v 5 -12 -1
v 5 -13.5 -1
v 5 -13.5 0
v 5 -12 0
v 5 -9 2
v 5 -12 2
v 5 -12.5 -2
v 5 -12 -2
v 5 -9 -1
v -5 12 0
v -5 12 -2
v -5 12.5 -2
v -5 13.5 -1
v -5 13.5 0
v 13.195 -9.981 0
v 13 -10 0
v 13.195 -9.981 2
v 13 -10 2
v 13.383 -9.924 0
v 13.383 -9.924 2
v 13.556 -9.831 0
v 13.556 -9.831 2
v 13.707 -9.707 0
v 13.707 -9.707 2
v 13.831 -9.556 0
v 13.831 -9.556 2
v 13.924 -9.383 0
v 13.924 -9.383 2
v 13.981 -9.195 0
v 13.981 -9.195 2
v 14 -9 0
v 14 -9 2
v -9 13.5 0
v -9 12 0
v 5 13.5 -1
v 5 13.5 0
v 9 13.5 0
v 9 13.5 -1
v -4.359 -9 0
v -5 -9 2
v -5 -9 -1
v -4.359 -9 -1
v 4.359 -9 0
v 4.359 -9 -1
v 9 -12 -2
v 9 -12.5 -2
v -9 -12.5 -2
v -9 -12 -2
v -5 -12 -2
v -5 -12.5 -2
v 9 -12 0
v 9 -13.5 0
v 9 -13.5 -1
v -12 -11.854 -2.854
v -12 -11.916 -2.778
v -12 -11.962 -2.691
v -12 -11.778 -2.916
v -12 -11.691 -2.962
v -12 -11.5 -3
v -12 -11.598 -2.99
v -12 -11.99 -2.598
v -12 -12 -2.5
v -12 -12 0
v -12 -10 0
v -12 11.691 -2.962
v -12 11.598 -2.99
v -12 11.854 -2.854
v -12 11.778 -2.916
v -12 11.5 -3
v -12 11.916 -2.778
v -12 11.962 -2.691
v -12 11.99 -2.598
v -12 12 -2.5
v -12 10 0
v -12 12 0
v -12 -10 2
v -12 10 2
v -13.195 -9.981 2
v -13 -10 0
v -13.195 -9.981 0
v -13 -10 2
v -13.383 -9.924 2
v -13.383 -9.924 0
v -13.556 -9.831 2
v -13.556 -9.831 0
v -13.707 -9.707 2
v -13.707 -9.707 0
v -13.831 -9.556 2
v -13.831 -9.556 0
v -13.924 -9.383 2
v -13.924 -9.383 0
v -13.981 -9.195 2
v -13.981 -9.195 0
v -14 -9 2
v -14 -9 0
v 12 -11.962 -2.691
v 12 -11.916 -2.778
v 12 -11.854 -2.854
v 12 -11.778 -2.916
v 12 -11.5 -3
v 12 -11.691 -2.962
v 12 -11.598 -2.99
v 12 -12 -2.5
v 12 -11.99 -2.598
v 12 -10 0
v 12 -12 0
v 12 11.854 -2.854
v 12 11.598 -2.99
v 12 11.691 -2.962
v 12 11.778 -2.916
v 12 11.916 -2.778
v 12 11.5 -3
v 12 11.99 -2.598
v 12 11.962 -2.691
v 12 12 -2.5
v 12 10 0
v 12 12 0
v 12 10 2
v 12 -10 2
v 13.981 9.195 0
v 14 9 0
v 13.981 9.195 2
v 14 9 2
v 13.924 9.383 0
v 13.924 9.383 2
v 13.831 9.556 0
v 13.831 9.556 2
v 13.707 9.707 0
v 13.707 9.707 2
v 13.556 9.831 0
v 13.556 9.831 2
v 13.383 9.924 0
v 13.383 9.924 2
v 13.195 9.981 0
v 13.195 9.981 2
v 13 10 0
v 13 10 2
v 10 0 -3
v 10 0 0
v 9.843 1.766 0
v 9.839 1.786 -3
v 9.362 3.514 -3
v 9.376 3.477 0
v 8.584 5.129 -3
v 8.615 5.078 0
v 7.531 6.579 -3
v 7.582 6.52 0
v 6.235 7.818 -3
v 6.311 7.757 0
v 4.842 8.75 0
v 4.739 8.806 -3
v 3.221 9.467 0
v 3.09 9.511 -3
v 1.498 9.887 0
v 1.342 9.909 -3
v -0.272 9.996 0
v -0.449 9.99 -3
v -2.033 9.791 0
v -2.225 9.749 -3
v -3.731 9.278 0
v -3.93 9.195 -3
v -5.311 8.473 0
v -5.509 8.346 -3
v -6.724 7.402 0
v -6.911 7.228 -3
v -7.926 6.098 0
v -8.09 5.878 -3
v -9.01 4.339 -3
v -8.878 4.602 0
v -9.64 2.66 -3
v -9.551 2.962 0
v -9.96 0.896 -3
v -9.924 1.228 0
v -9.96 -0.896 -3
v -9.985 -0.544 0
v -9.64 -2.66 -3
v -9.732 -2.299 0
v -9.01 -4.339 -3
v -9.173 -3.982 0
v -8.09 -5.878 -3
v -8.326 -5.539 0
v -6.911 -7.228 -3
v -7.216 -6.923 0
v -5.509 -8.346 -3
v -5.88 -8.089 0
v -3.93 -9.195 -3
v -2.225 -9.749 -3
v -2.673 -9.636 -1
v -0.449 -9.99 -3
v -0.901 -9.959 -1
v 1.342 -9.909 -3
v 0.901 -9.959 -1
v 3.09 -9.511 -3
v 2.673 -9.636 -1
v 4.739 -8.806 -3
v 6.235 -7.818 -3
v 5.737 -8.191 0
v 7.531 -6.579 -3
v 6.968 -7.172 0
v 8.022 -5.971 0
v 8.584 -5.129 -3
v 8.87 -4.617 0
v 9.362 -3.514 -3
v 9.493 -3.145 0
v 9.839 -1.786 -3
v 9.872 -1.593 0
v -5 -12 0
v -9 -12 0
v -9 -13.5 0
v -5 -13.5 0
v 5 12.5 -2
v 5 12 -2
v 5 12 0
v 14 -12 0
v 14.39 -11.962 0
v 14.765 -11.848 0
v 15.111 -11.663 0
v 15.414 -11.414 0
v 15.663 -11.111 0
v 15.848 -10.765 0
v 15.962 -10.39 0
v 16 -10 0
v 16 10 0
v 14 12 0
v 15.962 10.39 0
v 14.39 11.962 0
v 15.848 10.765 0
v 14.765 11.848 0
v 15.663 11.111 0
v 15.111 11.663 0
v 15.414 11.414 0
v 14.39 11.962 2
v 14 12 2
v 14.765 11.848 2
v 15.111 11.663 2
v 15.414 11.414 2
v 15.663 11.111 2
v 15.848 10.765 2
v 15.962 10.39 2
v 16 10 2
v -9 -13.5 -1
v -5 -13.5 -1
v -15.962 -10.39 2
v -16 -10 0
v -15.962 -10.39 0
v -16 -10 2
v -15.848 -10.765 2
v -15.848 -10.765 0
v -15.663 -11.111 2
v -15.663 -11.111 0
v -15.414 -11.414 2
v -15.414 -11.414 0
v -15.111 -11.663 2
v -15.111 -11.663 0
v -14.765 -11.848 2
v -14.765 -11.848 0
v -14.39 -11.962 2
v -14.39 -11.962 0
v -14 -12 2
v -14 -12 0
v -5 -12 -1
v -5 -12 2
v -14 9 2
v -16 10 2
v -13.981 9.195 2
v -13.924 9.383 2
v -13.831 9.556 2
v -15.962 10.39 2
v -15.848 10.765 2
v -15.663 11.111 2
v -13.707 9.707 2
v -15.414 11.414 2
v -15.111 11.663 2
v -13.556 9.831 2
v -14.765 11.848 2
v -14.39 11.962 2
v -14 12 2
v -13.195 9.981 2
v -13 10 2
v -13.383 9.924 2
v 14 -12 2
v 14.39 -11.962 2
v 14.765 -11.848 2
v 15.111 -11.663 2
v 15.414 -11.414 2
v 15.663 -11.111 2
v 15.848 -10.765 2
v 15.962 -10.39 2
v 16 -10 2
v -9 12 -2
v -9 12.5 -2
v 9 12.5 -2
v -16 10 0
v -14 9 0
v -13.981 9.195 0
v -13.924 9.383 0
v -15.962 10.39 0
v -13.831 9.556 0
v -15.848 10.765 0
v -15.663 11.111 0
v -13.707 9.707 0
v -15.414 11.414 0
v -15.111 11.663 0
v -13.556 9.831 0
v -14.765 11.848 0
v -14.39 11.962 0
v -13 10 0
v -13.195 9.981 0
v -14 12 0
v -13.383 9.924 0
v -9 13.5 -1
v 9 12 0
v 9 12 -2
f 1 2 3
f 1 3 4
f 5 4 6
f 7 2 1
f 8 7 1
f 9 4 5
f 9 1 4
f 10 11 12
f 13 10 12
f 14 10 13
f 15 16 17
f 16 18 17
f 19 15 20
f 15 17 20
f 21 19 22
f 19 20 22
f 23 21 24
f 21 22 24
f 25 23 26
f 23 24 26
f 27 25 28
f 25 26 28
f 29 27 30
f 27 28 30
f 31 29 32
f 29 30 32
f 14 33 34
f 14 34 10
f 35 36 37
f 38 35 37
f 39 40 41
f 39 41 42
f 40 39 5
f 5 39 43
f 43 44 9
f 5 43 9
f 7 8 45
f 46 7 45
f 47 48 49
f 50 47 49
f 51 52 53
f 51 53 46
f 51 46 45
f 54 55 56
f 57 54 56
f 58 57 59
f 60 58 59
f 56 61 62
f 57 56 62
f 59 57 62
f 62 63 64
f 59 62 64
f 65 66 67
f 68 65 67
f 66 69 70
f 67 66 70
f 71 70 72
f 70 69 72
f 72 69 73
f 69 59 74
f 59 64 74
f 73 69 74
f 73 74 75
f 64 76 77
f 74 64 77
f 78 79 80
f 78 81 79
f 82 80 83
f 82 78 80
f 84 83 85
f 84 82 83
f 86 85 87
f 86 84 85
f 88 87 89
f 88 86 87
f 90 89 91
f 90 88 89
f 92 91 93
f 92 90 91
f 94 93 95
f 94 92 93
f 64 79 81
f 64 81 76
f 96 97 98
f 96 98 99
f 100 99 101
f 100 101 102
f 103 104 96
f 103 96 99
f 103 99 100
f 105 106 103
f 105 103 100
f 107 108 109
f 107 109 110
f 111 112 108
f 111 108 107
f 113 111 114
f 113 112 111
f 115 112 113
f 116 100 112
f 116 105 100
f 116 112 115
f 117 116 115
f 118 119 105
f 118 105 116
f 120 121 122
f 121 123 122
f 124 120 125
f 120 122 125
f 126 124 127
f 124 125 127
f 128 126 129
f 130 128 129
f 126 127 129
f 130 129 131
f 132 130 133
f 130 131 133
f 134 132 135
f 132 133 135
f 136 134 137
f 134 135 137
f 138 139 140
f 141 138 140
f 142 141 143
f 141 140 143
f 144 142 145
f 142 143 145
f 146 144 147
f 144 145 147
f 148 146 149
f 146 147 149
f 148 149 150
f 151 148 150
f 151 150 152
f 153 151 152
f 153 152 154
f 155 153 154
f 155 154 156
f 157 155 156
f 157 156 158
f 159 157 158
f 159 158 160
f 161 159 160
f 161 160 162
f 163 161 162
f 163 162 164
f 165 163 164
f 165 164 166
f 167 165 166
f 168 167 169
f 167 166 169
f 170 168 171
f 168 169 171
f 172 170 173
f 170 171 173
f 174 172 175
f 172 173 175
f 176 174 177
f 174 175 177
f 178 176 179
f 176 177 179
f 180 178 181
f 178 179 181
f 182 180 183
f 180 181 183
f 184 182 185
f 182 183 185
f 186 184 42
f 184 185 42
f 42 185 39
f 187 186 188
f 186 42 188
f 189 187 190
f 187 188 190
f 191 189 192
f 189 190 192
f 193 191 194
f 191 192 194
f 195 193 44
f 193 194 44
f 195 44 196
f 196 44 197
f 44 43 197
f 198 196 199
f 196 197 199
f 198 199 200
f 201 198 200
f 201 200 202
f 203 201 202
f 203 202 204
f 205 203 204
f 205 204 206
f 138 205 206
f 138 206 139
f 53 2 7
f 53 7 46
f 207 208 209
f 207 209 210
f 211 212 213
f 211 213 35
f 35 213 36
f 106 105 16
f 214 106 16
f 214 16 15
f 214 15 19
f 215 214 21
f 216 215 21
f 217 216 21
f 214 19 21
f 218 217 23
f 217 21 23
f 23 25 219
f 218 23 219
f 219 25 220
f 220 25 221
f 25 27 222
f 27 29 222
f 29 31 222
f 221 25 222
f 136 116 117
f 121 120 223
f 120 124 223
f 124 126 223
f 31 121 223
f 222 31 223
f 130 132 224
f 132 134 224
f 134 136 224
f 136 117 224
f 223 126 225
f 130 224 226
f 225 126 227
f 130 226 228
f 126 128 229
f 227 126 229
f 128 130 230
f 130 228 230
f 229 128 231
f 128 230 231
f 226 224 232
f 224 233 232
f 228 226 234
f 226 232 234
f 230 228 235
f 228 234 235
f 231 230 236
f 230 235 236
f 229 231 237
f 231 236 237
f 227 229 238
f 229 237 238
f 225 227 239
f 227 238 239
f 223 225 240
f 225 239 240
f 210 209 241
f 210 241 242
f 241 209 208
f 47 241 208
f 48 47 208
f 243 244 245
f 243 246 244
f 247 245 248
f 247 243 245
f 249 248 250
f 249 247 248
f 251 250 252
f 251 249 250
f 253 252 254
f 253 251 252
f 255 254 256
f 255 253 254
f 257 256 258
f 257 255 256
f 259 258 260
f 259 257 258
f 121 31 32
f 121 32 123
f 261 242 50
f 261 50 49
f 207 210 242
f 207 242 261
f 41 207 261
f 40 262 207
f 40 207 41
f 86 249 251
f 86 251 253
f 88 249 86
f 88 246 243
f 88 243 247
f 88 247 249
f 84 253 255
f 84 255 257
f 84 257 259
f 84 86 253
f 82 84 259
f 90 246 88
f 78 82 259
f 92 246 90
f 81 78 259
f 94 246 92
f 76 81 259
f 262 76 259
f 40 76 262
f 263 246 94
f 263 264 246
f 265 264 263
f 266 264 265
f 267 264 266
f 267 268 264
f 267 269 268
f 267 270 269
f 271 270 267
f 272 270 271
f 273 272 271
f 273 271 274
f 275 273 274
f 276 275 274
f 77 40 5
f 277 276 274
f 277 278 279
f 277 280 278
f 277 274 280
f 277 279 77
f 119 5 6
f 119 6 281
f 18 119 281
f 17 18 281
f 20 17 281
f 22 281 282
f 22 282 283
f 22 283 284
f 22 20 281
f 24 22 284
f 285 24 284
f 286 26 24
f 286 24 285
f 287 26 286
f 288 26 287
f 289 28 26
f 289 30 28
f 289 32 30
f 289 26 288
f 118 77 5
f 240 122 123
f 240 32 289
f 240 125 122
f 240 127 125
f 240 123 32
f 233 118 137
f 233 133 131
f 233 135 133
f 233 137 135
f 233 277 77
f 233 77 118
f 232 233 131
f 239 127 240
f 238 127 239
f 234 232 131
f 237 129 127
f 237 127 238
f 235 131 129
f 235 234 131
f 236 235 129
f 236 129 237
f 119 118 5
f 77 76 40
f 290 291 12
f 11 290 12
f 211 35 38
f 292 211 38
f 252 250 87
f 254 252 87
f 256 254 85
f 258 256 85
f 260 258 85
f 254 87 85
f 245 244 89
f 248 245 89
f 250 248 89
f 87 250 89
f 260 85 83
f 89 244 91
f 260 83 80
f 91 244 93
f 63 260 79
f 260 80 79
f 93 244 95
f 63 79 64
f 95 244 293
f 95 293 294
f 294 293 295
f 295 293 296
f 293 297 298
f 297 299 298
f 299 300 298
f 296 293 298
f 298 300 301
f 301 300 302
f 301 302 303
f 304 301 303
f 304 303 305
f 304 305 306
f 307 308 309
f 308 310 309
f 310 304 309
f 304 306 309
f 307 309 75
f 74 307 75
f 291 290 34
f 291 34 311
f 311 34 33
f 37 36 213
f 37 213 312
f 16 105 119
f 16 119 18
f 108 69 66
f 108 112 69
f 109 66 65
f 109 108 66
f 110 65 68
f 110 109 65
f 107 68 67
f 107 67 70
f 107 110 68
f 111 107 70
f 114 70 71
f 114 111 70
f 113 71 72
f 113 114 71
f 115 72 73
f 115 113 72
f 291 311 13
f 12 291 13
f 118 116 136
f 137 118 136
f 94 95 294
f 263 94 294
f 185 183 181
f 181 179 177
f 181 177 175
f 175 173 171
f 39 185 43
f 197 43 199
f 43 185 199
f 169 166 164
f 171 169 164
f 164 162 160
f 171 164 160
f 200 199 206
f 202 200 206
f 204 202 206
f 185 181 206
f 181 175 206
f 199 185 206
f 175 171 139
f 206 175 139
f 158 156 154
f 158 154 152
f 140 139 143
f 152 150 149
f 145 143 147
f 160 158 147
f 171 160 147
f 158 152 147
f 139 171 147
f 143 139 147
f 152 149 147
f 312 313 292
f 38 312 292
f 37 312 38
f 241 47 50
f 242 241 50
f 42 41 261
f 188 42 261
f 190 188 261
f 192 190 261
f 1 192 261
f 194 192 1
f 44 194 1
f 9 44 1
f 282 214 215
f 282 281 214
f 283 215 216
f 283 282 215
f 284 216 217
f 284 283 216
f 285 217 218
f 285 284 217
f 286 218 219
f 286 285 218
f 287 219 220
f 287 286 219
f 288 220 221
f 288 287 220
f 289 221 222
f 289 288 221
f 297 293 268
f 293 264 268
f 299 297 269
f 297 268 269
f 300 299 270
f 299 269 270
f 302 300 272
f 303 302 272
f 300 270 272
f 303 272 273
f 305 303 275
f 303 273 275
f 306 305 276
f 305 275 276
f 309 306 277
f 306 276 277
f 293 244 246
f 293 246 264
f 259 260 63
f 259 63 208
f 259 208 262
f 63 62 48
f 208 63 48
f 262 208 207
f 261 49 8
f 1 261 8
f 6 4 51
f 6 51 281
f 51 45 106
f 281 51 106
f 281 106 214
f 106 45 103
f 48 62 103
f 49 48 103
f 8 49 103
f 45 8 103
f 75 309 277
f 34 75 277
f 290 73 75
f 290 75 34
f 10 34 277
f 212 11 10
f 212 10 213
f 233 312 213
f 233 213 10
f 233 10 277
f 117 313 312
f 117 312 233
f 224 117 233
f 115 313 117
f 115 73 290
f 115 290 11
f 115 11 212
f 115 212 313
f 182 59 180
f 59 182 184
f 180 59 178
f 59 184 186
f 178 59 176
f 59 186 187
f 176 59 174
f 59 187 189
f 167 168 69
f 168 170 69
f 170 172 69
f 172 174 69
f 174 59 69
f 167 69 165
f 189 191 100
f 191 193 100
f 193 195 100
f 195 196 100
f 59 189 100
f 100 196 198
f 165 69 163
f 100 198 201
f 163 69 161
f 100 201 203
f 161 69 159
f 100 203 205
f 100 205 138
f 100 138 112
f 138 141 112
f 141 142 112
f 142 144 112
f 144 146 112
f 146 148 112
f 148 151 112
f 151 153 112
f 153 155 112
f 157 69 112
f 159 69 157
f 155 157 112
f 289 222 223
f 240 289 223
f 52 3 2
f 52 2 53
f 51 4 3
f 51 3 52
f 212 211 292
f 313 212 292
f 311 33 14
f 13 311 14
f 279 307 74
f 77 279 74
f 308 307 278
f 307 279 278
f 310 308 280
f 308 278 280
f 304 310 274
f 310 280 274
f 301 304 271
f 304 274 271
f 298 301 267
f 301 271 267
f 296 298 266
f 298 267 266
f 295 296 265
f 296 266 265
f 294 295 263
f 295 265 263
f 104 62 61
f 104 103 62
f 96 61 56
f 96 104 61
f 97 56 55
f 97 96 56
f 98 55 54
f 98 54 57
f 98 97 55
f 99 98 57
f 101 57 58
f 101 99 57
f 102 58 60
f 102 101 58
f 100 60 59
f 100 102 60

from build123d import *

# Parameters (mm, degrees)
F2_W      = 32
F2_H      = 24
F3_DEPTH  = 2
F0_W      = 24
F0_H      = 24
F4_DEPTH  = 3
F1_R      = 10
F5_DEPTH  = 3
F6_W      = 2
F6_H      = 20
F7_DEPTH  = 2
F8_R      = 2
F9_R      = 1
F10_W     = 10
F10_H     = 3
F11_DEPTH = 1
F12_DEPTH = 2
F13_W     = 4
F13_H     = 1.5
F14_DEPTH = 2
F15_SIZE  = 1
F16_R     = 0.5


with BuildPart() as f3:
    # F2 (on Top) → F3 (new body)
    with BuildSketch(Plane.XY):
        Rectangle(F2_W, F2_H)
    extrude(amount=F3_DEPTH)

    # F0 (on Top) → F4 (join)
    with BuildSketch(Plane.XY):
        Rectangle(F0_W, F0_H)
    extrude(amount=-F4_DEPTH)

    # F1 (on Top) → F5 (cut)
    with BuildSketch(Plane.XY):
        Circle(F1_R)
    extrude(amount=-F5_DEPTH, mode=Mode.SUBTRACT)

    # F6 (on Top) → F7 (cut)
    with BuildSketch(Plane.XY):
        with Locations((-13, 0)):
            Rectangle(F6_W, F6_H)
        with Locations((13, 0)):
            Rectangle(F6_W, F6_H)
    extrude(amount=F7_DEPTH, mode=Mode.SUBTRACT)

    # F8
    f8_edges = [f3.edges().sort_by_distance(p)[0] for p in [
        (16, -12, 1),
        (16, 12, 1),
        (-16, -12, 1),
        (-16, 12, 1),
    ]]
    fillet(f8_edges, radius=F8_R)

    # F9
    f9_edges = [f3.edges().sort_by_distance(p)[0] for p in [
        (-14, 10, 1),
        (14, 10, 1),
        (-14, -10, 1),
        (14, -10, 1),
    ]]
    fillet(f9_edges, radius=F9_R)

    # F10 (on Top) → F11 (cut)
    with BuildSketch(Plane.XY):
        with Locations((0, -10.5)):
            Rectangle(F10_W, F10_H)
    extrude(amount=-F11_DEPTH, mode=Mode.SUBTRACT)

    # F10 (on Top) → F12 (cut)
    with BuildSketch(Plane.XY):
        with Locations((0, -10.5)):
            Rectangle(F10_W, F10_H)
    extrude(amount=F12_DEPTH, mode=Mode.SUBTRACT)

    # F13 (on Top) → F14 (join)
    with BuildSketch(Plane.XY):
        with Locations((-7, -12.75)):
            Rectangle(F13_W, F13_H)
        with Locations((-7, 12.75)):
            Rectangle(F13_W, F13_H)
        with Locations((7, -12.75)):
            Rectangle(F13_W, F13_H)
        with Locations((7, 12.75)):
            Rectangle(F13_W, F13_H)
    extrude(amount=-F14_DEPTH)

    # F15
    f15_edges = [f3.edges().sort_by_distance(p)[0] for p in [
        (-7, -13.5, -2),
        (7, -13.5, -2),
        (7, 13.5, -2),
        (-7, 13.5, -2),
    ]]
    chamfer(f15_edges, length=F15_SIZE)

    # F16
    f16_edges = [f3.edges().sort_by_distance(p)[0] for p in [
        (0, -12, -3),
        (0, 12, -3),
    ]]
    fillet(f16_edges, radius=F16_R)


solid = f3.part
